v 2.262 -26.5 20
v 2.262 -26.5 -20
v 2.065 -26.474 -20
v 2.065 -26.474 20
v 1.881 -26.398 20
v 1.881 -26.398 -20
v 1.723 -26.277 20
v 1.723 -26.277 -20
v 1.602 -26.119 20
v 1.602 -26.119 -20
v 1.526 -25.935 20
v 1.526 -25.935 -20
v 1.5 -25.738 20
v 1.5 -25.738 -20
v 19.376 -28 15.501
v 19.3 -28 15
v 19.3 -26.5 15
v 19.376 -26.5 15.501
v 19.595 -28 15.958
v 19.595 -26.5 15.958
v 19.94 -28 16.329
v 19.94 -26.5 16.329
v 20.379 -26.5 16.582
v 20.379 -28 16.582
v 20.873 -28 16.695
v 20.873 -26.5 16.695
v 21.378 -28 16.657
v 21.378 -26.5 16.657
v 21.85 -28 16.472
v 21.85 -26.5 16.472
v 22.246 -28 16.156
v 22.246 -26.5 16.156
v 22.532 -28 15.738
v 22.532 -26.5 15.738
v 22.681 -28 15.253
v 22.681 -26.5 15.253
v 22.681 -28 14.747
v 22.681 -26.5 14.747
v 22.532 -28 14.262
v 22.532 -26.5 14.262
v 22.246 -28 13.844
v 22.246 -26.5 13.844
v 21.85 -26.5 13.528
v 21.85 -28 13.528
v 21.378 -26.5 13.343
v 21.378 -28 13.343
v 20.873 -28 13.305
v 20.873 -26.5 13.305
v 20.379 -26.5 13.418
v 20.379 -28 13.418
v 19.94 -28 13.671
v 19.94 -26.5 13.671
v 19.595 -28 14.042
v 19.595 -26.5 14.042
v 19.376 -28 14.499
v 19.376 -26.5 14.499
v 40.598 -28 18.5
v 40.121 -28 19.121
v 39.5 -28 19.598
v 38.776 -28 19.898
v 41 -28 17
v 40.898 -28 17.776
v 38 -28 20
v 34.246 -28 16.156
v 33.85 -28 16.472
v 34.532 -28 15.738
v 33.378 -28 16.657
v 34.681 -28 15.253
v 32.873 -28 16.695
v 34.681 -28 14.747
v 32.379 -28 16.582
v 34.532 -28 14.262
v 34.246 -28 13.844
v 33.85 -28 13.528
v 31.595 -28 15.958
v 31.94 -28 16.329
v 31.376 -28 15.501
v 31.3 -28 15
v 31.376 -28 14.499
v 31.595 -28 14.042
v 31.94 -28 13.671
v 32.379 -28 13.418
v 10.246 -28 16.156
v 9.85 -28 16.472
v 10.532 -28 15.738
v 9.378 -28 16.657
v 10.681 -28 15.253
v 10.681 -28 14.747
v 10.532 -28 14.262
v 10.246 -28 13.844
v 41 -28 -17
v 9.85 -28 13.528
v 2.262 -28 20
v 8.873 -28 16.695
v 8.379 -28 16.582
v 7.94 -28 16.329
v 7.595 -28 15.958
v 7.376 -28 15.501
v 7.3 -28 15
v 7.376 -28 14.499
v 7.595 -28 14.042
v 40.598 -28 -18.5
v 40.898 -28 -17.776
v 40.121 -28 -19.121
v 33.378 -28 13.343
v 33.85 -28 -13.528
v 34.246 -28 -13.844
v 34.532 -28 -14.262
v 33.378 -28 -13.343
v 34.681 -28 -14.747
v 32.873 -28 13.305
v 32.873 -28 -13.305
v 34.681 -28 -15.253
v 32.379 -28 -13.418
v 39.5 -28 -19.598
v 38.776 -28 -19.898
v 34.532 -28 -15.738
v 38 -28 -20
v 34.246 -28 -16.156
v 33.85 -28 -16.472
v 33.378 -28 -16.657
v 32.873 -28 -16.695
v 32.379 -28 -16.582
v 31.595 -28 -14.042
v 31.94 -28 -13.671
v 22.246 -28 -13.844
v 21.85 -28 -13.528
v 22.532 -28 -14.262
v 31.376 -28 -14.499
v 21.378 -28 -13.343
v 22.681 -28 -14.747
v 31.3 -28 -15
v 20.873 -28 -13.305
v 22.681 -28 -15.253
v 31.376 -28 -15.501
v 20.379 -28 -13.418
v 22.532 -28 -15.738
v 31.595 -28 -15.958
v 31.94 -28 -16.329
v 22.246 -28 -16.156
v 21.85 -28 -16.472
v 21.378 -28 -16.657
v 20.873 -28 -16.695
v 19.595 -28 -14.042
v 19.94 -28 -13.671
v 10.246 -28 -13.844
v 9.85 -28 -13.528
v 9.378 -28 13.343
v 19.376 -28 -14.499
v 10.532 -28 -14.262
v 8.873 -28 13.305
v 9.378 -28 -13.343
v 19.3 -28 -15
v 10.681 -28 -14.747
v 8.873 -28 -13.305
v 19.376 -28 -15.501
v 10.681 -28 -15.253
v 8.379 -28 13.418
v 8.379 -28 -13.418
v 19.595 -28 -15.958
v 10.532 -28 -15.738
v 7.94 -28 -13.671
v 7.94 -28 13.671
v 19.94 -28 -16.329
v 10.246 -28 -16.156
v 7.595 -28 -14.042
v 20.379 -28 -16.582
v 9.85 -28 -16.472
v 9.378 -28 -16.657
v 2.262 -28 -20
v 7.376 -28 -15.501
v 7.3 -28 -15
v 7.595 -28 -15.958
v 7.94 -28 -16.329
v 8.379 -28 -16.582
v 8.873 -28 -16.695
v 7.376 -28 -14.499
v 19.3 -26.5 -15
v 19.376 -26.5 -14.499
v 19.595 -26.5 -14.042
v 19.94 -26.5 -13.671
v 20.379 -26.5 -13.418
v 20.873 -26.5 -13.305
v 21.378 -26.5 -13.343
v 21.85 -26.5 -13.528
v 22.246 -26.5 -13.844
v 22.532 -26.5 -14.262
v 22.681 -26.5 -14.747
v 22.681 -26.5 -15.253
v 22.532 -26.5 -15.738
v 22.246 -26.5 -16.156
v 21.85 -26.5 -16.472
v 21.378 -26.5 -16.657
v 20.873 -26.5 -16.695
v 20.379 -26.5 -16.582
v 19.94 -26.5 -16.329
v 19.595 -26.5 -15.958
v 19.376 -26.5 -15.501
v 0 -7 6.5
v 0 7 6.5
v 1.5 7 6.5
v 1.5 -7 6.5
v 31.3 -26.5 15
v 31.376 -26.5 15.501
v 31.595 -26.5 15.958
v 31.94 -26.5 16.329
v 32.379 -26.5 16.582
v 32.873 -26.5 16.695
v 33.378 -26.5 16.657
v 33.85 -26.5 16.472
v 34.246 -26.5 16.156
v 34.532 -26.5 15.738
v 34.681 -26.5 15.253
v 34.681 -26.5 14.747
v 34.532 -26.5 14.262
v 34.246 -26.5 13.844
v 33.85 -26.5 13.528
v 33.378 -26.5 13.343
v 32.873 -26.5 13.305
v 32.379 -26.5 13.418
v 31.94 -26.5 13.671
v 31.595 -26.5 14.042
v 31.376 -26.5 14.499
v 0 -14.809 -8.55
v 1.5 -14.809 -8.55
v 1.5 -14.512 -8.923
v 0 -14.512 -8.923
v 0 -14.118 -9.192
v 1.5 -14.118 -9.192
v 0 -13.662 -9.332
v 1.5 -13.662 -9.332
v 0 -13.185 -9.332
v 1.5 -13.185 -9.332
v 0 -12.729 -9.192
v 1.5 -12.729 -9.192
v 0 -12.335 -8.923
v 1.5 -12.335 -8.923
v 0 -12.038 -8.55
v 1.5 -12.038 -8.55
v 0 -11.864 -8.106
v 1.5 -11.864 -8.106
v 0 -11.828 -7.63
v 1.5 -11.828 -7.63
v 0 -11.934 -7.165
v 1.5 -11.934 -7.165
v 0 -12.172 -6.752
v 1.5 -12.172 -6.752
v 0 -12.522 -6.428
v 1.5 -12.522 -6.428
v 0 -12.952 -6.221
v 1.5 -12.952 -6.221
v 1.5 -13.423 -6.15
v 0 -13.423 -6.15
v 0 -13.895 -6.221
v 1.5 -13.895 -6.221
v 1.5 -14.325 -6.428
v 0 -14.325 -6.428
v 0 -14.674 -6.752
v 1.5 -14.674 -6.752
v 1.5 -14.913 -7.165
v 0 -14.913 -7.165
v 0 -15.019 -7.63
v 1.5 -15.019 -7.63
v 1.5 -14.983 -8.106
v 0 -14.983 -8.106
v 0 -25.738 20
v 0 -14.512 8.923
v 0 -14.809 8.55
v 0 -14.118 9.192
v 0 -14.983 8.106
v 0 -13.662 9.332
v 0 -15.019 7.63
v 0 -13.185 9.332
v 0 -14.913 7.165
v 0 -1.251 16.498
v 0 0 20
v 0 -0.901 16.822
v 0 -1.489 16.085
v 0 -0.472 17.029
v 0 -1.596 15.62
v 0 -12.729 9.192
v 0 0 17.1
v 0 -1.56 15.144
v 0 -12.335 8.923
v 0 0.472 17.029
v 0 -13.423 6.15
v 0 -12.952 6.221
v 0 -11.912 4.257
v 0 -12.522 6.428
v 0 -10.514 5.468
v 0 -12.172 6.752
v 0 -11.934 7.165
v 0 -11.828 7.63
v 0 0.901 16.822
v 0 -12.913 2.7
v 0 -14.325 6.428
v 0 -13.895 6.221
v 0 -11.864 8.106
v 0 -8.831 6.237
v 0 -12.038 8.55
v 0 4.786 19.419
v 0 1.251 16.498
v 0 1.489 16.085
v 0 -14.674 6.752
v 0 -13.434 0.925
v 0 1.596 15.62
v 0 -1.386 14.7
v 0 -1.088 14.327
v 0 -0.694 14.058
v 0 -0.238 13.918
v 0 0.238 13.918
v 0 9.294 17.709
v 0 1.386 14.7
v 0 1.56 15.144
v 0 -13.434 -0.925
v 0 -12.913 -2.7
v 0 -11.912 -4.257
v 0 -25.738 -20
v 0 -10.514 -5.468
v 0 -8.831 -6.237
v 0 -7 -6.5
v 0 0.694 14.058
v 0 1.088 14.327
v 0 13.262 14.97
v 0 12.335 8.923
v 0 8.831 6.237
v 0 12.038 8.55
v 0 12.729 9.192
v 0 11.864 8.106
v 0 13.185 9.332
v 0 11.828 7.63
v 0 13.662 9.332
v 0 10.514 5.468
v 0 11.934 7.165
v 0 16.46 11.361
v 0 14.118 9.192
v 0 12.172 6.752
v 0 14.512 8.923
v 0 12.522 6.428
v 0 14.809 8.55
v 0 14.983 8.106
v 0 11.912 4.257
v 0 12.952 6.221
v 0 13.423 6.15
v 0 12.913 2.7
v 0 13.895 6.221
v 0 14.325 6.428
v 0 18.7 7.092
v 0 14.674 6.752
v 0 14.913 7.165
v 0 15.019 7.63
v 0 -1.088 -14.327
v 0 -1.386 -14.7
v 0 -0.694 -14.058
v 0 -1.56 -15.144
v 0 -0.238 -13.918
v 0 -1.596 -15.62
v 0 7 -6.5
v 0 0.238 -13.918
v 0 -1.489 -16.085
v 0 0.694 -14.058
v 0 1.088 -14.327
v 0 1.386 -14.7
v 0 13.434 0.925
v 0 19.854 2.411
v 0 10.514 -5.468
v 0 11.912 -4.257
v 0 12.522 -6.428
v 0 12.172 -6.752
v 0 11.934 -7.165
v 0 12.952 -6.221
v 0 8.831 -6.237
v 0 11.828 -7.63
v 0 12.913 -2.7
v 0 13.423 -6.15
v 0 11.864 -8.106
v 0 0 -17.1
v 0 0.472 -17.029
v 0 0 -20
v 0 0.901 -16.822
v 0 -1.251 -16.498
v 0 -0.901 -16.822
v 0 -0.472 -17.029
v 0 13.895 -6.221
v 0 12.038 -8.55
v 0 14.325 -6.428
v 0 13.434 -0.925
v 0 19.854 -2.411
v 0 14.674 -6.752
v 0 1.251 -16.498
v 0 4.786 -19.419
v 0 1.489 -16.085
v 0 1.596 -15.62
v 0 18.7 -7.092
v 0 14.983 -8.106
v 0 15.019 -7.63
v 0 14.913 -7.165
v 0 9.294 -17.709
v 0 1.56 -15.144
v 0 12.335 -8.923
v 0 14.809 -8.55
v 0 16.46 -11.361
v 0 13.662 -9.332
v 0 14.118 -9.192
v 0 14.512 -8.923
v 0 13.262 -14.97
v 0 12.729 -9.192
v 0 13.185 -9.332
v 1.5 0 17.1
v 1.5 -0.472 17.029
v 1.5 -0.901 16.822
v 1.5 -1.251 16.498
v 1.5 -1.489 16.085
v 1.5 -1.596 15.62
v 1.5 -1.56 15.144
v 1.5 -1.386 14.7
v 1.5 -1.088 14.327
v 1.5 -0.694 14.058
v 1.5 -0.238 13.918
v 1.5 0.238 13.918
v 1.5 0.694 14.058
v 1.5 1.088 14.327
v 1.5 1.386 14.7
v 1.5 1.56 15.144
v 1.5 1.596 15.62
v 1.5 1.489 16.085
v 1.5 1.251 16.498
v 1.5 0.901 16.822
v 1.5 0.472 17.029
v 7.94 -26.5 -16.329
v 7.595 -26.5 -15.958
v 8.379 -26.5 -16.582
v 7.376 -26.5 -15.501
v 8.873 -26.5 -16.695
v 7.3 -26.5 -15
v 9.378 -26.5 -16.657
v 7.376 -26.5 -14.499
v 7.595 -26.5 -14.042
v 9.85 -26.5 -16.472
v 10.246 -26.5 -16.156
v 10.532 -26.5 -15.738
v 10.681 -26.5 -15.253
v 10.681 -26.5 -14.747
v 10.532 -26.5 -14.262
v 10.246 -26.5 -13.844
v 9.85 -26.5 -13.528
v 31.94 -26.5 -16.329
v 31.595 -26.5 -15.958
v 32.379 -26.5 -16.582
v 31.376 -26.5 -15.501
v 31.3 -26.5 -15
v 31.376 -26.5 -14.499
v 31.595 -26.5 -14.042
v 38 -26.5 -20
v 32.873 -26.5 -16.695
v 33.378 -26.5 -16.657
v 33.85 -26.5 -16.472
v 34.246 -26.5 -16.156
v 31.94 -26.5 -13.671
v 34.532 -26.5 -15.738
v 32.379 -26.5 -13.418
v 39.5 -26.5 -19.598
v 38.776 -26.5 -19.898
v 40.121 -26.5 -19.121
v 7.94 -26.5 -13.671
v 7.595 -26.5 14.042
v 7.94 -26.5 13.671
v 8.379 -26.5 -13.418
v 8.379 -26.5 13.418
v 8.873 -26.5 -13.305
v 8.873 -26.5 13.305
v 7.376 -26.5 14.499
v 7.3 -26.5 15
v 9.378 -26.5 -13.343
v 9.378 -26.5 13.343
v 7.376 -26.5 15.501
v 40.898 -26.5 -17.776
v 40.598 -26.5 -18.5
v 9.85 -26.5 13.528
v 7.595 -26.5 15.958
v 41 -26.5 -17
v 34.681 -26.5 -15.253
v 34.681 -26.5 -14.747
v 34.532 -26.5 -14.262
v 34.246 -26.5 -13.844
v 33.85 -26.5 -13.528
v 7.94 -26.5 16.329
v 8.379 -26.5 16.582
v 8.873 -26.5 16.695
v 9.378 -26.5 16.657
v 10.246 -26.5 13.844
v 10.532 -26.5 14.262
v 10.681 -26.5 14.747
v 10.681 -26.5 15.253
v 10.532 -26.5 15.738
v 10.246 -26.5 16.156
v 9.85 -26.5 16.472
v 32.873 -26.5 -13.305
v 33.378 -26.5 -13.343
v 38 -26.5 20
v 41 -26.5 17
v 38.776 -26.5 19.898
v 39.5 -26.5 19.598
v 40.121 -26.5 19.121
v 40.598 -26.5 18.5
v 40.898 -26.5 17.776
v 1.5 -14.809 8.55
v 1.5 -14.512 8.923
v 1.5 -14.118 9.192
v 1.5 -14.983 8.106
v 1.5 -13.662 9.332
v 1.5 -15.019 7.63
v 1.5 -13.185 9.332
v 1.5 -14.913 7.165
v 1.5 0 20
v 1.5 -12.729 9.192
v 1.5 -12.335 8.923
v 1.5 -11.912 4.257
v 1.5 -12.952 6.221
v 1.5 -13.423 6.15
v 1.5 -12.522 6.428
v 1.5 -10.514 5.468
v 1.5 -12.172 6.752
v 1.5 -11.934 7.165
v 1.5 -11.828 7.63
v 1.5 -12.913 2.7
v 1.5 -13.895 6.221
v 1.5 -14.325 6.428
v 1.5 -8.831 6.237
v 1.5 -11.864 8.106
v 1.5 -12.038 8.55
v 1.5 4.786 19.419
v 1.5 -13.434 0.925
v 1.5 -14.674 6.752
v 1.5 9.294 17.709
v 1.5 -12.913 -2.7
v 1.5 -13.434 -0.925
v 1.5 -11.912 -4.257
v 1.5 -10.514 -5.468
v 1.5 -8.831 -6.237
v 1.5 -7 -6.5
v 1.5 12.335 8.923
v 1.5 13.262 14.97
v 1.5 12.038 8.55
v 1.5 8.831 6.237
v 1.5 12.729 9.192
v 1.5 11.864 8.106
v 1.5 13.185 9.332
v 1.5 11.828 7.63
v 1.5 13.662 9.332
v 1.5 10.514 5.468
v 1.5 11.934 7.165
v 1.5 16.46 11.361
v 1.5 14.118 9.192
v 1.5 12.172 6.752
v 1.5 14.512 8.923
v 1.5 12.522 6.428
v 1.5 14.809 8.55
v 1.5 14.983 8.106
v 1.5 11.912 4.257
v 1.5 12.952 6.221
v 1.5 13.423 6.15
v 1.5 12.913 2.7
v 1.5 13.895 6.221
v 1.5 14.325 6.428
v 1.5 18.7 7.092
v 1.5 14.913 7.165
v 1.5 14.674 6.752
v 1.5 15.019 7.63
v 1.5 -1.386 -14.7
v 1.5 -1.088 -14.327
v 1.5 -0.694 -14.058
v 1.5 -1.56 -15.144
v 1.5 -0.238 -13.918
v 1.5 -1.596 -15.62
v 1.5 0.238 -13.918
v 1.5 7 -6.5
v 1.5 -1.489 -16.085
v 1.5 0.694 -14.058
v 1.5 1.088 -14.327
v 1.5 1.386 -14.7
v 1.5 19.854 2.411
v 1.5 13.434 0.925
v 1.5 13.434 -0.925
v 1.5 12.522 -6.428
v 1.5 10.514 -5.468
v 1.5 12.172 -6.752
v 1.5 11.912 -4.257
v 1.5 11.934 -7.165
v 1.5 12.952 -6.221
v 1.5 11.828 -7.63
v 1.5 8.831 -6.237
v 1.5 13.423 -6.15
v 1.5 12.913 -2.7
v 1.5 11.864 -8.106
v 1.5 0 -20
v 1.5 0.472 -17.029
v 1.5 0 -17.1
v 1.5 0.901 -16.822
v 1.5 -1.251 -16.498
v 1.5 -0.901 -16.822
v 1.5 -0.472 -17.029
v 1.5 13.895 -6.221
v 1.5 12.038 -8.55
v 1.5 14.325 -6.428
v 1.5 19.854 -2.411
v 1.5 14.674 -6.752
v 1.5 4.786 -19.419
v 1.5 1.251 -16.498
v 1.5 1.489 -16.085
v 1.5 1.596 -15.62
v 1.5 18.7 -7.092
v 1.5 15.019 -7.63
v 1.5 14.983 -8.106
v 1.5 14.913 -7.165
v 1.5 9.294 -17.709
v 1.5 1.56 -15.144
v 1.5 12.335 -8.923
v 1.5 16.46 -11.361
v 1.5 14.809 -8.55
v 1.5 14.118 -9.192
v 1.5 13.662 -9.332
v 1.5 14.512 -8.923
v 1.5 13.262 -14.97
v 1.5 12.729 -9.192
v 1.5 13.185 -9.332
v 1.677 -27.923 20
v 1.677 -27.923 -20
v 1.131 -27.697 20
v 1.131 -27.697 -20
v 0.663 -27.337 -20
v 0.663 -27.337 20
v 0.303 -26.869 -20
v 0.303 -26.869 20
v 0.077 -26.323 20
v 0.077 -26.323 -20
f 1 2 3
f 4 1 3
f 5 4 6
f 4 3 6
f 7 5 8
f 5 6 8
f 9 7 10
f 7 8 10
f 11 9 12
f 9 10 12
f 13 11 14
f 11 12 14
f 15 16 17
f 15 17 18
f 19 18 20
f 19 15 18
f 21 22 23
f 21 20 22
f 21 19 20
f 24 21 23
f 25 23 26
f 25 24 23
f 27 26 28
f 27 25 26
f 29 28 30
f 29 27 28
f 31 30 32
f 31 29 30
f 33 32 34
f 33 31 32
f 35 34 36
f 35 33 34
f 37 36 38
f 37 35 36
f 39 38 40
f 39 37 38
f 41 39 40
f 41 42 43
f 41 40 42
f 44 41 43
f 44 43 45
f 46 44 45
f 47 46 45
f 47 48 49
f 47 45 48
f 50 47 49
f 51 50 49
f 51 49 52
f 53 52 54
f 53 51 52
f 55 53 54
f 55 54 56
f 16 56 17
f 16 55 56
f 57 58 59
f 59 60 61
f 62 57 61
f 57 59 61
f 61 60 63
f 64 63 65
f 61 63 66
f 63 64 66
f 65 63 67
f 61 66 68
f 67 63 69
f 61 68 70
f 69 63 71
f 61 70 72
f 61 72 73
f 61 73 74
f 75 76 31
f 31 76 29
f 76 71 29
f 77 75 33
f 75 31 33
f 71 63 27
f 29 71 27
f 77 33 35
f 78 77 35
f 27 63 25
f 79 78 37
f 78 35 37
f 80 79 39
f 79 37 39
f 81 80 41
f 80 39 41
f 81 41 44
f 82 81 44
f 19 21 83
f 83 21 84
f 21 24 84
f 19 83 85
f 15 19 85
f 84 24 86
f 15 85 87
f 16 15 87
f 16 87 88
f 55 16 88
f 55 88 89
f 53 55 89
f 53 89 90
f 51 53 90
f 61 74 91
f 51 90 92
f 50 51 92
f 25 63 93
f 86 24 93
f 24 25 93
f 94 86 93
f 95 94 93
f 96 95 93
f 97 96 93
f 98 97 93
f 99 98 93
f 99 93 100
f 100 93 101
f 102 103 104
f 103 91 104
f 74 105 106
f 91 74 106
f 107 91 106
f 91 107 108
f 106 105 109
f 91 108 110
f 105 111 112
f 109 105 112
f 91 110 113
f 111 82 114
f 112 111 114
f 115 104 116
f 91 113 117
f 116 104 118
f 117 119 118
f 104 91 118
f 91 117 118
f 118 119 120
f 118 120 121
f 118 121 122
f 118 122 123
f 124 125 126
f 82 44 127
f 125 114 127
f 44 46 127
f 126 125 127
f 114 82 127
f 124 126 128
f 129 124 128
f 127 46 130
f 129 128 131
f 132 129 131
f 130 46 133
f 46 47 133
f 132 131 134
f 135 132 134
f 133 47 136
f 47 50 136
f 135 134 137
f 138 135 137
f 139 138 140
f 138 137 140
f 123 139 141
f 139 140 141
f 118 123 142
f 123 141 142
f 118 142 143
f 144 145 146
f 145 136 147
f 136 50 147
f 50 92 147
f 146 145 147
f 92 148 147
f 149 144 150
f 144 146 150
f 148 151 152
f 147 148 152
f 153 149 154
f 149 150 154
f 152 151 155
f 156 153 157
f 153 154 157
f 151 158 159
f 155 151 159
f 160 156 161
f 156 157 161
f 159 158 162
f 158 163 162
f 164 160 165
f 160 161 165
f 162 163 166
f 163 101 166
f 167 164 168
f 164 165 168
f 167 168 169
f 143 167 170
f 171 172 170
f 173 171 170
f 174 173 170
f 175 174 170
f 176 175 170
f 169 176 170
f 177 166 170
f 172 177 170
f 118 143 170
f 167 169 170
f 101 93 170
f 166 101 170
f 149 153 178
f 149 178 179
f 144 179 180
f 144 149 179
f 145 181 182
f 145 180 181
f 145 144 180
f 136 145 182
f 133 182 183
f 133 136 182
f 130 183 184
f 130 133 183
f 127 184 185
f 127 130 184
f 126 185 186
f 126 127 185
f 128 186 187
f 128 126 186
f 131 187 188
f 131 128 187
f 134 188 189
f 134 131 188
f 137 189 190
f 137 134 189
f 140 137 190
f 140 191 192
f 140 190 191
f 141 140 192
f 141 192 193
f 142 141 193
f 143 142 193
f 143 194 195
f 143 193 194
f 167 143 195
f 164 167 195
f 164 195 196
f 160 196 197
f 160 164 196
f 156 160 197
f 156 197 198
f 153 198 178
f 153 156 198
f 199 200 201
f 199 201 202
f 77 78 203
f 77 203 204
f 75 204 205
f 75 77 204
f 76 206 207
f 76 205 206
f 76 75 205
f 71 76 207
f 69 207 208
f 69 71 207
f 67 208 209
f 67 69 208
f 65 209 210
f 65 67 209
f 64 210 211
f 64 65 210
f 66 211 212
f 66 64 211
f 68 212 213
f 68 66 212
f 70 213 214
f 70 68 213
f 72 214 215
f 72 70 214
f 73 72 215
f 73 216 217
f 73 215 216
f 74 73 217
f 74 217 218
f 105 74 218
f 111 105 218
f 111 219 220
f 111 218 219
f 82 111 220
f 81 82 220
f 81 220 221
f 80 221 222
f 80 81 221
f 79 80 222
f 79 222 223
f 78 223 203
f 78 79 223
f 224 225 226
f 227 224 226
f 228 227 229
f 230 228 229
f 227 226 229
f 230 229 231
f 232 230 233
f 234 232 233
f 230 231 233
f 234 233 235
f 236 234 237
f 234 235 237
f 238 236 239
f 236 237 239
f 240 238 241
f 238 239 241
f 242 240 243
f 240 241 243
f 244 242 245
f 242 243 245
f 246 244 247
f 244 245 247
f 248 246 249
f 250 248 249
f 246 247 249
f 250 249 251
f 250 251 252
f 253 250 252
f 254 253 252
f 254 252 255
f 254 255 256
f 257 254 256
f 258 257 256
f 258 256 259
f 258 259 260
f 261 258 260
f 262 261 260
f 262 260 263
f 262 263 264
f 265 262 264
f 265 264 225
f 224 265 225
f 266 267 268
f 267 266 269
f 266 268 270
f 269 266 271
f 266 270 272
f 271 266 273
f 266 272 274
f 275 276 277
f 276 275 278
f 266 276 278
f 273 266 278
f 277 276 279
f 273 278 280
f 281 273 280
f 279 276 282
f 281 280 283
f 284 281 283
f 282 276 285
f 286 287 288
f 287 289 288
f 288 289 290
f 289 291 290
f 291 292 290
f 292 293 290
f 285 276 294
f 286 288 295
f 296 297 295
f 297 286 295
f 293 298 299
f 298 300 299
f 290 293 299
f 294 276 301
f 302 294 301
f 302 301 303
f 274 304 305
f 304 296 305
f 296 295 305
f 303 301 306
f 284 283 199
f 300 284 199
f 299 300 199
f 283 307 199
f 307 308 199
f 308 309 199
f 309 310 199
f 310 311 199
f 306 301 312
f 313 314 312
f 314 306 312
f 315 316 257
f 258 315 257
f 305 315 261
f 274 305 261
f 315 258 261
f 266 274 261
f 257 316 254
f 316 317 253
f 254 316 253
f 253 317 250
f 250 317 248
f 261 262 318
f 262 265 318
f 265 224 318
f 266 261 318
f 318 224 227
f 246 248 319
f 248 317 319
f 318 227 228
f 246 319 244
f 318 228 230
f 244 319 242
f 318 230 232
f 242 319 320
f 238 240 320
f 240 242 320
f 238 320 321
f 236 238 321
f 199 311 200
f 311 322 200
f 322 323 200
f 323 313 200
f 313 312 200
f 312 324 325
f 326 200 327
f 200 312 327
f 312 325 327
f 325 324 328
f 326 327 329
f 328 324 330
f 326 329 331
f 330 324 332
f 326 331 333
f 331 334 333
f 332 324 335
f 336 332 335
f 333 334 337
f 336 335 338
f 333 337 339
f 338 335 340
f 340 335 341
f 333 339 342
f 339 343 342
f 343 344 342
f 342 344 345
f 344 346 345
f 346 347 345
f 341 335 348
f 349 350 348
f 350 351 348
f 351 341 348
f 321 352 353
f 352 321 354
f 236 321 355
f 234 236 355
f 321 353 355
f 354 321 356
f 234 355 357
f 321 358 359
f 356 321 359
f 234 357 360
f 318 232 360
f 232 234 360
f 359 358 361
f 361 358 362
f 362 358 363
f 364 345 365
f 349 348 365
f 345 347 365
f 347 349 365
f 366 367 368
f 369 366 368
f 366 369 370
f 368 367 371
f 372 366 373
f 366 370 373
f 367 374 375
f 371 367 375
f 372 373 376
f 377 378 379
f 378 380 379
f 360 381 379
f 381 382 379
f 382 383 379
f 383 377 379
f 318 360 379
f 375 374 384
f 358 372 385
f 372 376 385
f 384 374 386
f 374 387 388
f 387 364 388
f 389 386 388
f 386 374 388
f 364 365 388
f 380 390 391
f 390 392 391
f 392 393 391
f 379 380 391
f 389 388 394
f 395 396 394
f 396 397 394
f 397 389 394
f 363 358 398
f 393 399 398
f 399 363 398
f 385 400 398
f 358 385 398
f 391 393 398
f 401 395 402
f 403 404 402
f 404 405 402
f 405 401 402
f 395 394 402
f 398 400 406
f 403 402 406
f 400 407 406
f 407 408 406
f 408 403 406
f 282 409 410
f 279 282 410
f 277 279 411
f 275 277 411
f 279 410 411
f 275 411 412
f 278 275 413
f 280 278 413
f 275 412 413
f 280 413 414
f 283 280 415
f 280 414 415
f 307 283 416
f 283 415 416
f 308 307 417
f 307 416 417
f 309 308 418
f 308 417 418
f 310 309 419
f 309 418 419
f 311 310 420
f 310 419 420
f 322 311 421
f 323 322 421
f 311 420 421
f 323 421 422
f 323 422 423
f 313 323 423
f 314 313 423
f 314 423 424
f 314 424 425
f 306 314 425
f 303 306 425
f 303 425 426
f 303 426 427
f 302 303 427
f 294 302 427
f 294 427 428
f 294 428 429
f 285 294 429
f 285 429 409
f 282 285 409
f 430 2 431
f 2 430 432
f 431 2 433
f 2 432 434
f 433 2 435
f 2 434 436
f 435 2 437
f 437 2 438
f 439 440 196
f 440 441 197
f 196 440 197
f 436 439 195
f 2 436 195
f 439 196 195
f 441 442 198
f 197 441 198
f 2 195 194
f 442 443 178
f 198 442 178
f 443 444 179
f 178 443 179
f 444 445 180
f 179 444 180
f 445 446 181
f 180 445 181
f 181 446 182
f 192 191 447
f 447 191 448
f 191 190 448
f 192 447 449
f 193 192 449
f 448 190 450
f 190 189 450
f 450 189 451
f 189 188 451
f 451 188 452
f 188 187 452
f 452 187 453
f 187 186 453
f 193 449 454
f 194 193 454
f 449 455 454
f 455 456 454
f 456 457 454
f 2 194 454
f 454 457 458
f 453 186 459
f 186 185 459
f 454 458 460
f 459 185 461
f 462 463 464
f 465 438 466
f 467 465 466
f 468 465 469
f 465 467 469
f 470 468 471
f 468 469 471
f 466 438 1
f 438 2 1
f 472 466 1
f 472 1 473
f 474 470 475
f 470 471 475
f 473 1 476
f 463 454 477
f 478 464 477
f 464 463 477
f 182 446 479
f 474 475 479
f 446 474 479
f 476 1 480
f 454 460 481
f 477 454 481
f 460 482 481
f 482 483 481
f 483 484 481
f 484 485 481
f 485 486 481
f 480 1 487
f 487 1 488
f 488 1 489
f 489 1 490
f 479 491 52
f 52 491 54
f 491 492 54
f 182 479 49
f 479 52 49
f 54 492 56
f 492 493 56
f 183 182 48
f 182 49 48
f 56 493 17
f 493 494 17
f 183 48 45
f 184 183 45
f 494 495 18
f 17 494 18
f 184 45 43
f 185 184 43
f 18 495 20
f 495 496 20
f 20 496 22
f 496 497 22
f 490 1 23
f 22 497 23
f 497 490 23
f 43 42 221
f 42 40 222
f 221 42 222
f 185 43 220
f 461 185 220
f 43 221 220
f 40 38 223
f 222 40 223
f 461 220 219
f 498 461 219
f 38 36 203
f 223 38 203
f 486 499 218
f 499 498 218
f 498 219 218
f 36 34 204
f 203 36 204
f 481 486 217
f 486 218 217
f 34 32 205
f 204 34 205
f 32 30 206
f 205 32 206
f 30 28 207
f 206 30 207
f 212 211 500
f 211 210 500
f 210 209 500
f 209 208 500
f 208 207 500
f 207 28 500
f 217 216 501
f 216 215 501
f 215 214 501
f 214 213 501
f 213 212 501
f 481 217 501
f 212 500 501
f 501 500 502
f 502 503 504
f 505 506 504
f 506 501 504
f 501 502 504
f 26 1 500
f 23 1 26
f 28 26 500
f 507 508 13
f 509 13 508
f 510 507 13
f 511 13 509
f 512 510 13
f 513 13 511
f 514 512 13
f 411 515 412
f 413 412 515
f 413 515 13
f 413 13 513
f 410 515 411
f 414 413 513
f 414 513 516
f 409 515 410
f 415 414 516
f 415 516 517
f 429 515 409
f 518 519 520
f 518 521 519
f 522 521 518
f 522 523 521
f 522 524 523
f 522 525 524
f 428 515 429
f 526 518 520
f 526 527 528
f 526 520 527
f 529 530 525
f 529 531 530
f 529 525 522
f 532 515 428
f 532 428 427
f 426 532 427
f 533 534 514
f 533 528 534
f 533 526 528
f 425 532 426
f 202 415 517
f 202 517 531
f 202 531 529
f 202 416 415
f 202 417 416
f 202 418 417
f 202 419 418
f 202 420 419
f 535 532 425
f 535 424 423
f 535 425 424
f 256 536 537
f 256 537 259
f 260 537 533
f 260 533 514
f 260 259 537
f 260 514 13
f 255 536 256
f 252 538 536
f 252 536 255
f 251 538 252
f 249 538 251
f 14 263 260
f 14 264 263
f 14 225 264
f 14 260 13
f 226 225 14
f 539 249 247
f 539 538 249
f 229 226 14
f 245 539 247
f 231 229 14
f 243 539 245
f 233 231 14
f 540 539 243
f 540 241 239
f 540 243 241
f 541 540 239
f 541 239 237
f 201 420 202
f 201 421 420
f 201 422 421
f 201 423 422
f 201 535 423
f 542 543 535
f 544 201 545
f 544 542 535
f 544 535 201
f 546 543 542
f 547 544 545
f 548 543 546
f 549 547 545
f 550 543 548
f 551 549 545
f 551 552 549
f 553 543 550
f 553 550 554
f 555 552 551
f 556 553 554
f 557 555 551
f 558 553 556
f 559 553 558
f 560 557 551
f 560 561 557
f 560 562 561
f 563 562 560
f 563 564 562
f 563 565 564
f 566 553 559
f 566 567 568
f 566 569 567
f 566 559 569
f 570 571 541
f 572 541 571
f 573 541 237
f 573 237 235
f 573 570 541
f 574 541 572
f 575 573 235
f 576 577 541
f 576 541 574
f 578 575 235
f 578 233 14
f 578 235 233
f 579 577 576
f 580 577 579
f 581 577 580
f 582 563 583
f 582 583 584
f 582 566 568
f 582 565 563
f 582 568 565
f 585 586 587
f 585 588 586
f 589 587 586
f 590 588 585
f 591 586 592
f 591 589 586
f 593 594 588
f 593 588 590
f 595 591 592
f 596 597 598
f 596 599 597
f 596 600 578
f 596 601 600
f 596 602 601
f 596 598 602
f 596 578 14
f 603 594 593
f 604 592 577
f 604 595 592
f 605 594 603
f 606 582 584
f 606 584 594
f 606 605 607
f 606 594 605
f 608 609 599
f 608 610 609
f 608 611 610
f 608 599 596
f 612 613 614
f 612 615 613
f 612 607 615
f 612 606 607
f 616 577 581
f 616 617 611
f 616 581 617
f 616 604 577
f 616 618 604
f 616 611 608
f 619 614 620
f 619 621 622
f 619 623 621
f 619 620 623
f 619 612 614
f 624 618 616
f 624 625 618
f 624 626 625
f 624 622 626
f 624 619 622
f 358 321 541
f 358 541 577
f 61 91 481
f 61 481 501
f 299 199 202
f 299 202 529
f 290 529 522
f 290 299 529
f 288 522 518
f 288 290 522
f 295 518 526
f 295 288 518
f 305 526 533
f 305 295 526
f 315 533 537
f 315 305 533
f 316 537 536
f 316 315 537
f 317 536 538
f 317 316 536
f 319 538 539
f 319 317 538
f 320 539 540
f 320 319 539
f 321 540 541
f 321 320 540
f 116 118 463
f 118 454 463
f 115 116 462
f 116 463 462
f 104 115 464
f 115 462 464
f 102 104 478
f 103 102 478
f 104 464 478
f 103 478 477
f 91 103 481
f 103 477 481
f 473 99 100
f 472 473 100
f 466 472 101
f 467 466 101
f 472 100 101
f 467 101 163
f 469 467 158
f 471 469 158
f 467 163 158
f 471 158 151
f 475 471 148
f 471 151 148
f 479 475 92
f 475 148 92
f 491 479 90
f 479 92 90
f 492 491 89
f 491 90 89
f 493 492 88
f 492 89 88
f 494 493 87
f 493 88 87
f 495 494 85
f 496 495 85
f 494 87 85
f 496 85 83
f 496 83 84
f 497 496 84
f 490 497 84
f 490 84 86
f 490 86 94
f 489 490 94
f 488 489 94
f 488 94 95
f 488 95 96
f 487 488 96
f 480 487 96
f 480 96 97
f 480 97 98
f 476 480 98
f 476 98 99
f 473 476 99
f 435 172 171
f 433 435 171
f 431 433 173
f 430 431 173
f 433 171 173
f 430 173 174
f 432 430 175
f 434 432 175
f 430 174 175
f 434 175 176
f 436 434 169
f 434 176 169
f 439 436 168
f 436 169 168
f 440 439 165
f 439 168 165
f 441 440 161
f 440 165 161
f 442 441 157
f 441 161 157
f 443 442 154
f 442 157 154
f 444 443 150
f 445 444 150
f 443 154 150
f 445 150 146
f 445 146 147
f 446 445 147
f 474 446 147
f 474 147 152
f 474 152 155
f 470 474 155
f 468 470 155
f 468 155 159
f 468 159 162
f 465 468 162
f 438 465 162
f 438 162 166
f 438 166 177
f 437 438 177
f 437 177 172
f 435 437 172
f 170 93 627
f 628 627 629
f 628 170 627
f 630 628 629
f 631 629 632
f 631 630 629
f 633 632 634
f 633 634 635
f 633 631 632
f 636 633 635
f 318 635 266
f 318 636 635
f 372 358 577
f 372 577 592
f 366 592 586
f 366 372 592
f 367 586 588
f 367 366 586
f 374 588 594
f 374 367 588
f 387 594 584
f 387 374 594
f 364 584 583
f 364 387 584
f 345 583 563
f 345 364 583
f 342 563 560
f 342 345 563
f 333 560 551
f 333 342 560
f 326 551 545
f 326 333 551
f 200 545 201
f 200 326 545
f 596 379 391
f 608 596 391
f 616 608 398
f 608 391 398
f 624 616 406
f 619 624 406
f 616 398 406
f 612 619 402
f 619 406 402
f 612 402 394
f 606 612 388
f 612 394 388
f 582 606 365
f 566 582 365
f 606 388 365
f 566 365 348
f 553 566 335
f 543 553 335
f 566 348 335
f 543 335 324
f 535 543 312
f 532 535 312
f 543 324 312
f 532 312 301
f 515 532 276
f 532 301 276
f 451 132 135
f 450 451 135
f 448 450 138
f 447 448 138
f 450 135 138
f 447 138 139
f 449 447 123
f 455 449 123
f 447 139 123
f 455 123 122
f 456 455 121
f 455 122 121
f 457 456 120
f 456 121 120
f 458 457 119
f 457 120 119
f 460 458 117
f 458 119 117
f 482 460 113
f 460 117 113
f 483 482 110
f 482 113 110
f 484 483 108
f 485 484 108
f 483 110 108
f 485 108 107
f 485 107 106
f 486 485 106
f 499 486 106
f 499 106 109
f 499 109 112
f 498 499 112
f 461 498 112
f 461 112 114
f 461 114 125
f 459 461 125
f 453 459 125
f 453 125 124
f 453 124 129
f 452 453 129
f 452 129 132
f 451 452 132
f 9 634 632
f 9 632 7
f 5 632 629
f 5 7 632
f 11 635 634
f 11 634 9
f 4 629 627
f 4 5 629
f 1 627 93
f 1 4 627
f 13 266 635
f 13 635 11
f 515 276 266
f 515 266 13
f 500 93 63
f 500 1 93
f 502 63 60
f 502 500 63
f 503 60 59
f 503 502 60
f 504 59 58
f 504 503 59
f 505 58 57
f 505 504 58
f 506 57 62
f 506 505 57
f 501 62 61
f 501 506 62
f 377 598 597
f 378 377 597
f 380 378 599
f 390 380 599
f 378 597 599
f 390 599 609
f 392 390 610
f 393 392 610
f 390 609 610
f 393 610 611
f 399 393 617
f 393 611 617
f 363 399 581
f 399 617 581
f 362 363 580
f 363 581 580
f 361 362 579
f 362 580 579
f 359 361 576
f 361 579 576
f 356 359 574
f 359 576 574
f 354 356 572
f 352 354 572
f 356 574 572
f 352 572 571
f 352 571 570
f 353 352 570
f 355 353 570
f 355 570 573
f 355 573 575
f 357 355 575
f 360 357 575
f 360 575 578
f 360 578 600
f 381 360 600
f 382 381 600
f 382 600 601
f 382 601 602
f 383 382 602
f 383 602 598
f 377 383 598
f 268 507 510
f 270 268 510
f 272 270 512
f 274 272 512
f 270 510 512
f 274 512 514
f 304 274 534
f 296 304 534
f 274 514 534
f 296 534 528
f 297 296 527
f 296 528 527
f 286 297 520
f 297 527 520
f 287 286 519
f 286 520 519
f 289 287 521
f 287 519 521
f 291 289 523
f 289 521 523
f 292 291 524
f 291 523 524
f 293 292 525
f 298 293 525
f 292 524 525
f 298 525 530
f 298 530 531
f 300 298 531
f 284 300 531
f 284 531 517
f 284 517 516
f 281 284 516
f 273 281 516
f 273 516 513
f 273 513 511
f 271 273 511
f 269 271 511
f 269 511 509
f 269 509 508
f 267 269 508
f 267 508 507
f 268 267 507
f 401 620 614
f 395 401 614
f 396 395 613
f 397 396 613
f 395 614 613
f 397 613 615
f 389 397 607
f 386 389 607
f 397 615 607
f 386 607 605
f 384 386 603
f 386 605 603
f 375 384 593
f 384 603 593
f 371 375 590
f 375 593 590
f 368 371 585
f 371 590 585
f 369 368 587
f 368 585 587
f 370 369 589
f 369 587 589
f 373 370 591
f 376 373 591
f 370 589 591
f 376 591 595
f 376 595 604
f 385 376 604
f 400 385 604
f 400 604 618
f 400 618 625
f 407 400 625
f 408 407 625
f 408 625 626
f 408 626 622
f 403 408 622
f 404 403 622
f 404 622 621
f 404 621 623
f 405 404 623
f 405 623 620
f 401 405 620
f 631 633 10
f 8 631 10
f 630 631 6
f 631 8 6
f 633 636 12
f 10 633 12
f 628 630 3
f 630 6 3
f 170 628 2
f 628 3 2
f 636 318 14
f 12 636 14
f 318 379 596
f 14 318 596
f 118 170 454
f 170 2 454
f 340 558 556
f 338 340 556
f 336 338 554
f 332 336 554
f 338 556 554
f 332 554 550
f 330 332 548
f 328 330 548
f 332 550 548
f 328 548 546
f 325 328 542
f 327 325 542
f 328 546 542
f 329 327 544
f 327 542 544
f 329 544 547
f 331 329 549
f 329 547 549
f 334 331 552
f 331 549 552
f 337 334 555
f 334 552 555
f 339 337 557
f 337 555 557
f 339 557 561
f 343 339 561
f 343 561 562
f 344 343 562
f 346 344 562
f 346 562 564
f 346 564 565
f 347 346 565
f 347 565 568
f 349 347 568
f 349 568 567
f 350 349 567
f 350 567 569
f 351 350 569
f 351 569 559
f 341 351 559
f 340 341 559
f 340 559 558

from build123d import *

# Parameters (mm, degrees)
BOSS_EXTRUDE1_DEPTH     = 1.5
SKETCH2_W               = 41
SKETCH2_H               = 40
BOSS_EXTRUDE2_DEPTH     = 1.5
CONVERT_SOLID1_START    = -20
CONVERT_SOLID1_DEPTH    = 40
CONVERT_SOLID1_2_DEPTH  = 40
M3_CLEARANCE_HOLE1_D    = 3.2
CIRPATTERN1_COUNT       = 6
CUT_EXTRUDE1_DEPTH      = 54.525694764
M3_CLEARANCE_HOLE2_D    = 3.4
LPATTERN1_COUNT         = 2
LPATTERN1_PITCH         = 24
LPATTERN1_COPY_1_D      = 3.4
FILLET1_R               = 3
CUT_EXTRUDE2_DEPTH      = 10
CUT_EXTRUDE2_DEPTH_BACK = 66.140233343
SKETCH12_R              = 1.7


# Read off the part's stored shape, not the designer's step: Convert-Solid1
with BuildPart() as part:
    # Sketch1 → Boss-Extrude1 (new body)
    with BuildSketch(Plane(origin=(0, 0, 0), x_dir=(0, 0, -1), z_dir=(1, 0, 0))):
        with BuildLine():
            Line((-20, 0), (-20, -28))
            Line((-20, -28), (20, -28))
            Line((20, -28), (20, 0))
            ThreePointArc((20, 0), (0, 20), (-20, 0))
        make_face()
    extrude(amount=BOSS_EXTRUDE1_DEPTH)

    # Sketch2 → Boss-Extrude2 (add)
    with BuildSketch(Plane.XZ.offset(28)):
        with Locations((20.5, 0)):
            Rectangle(SKETCH2_W, SKETCH2_H)
    extrude(amount=-BOSS_EXTRUDE2_DEPTH)

    # Convert-Solid1 outline → Convert-Solid1 (cut)
    with BuildSketch(Plane.XY.offset(CONVERT_SOLID1_START)):
        with BuildLine():
            Line((0, -28), (2.262, -28))
            ThreePointArc((2.262, -28), (0.662524461, -27.337475539), (0, -25.738))
            Line((0, -25.738), (0, -28))
        make_face()
    extrude(amount=CONVERT_SOLID1_DEPTH, mode=Mode.SUBTRACT)

    # Convert-Solid1 2 outline → Convert-Solid1 2 (add)
    with BuildSketch(Plane.XY.offset(CONVERT_SOLID1_START)):
        with BuildLine():
            Line((1.5, -26.5), (2.262, -26.5))
            ThreePointArc((2.262, -26.5), (1.723184633, -26.276815367), (1.5, -25.738))
            Line((1.5, -25.738), (1.5, -26.5))
        make_face()
    extrude(amount=CONVERT_SOLID1_2_DEPTH)

    # M3 Clearance Hole1 (through all)
    with Locations(Plane.ZY):
        with Locations((-15.5, 0)):
            m3_clearance_hole1 = Hole(M3_CLEARANCE_HOLE1_D / 2)

    # CirPattern1: M3 Clearance Hole1 ×6 about axis
    cirpattern1_axis = Axis((0, 0, 0), (1, 0, 0))
    for i in range(1, CIRPATTERN1_COUNT):
        add(m3_clearance_hole1.rotate(cirpattern1_axis, i * 360 / CIRPATTERN1_COUNT), mode=Mode.SUBTRACT)

    # Sketch9 → Cut-Extrude1 (cut, through all)
    with BuildSketch(Plane.ZY):
        with BuildLine():
            Line((6.5, 7), (6.5, -7))
            ThreePointArc((6.5, -7), (0, -13.5), (-6.5, -7))
            Line((-6.5, -7), (-6.5, 7))
            ThreePointArc((-6.5, 7), (0, 13.5), (6.5, 7))
        make_face()
    extrude(amount=-CUT_EXTRUDE1_DEPTH, mode=Mode.SUBTRACT)

    # M3 Clearance Hole2 (through all)
    with Locations(Plane(origin=(0, -26.5, 0), x_dir=(1, 0, 0), z_dir=(0, 1, 0))):
        with Locations((33, 15)):
            m3_clearance_hole2 = Hole(M3_CLEARANCE_HOLE2_D / 2)

    # Mirror1: M3 Clearance Hole2 across plane
    add(m3_clearance_hole2.mirror(Plane.XY), mode=Mode.SUBTRACT)

    # LPattern1: M3 Clearance Hole2 ×2
    with Locations(*[(-i * LPATTERN1_PITCH, 0, 0) for i in range(1, LPATTERN1_COUNT)]):
        add(m3_clearance_hole2, mode=Mode.SUBTRACT)

    # LPattern1 copy 1 (through all)
    with Locations(Plane(origin=(-24, -26.5, 0), x_dir=(1, 0, 0), z_dir=(0, 1, 0))):
        with Locations((33, -15)):
            Hole(LPATTERN1_COPY_1_D / 2)

    # Fillet1
    fillet1_edges = [part.edges().sort_by_distance(p)[0] for p in [
        (41, -27.25, 20),
        (41, -27.25, -20),
    ]]
    fillet(fillet1_edges, radius=FILLET1_R)

    # Sketch12 → Cut-Extrude2 (cut, two sides: drawn at the far end of the back side and taken through both)
    with BuildSketch(Plane(origin=(0, -26.5, 0), x_dir=(1, 0, 0), z_dir=(0, 1, 0)).offset(-CUT_EXTRUDE2_DEPTH_BACK)):
        with Locations(Location((21, 15, 0), (0, 0, 180))):
            Circle(SKETCH12_R)
        with Locations(Location((21, -15, 0), (0, 0, 180))):
            Circle(SKETCH12_R)
    extrude(amount=CUT_EXTRUDE2_DEPTH + CUT_EXTRUDE2_DEPTH_BACK, mode=Mode.SUBTRACT)


solid = part.part
